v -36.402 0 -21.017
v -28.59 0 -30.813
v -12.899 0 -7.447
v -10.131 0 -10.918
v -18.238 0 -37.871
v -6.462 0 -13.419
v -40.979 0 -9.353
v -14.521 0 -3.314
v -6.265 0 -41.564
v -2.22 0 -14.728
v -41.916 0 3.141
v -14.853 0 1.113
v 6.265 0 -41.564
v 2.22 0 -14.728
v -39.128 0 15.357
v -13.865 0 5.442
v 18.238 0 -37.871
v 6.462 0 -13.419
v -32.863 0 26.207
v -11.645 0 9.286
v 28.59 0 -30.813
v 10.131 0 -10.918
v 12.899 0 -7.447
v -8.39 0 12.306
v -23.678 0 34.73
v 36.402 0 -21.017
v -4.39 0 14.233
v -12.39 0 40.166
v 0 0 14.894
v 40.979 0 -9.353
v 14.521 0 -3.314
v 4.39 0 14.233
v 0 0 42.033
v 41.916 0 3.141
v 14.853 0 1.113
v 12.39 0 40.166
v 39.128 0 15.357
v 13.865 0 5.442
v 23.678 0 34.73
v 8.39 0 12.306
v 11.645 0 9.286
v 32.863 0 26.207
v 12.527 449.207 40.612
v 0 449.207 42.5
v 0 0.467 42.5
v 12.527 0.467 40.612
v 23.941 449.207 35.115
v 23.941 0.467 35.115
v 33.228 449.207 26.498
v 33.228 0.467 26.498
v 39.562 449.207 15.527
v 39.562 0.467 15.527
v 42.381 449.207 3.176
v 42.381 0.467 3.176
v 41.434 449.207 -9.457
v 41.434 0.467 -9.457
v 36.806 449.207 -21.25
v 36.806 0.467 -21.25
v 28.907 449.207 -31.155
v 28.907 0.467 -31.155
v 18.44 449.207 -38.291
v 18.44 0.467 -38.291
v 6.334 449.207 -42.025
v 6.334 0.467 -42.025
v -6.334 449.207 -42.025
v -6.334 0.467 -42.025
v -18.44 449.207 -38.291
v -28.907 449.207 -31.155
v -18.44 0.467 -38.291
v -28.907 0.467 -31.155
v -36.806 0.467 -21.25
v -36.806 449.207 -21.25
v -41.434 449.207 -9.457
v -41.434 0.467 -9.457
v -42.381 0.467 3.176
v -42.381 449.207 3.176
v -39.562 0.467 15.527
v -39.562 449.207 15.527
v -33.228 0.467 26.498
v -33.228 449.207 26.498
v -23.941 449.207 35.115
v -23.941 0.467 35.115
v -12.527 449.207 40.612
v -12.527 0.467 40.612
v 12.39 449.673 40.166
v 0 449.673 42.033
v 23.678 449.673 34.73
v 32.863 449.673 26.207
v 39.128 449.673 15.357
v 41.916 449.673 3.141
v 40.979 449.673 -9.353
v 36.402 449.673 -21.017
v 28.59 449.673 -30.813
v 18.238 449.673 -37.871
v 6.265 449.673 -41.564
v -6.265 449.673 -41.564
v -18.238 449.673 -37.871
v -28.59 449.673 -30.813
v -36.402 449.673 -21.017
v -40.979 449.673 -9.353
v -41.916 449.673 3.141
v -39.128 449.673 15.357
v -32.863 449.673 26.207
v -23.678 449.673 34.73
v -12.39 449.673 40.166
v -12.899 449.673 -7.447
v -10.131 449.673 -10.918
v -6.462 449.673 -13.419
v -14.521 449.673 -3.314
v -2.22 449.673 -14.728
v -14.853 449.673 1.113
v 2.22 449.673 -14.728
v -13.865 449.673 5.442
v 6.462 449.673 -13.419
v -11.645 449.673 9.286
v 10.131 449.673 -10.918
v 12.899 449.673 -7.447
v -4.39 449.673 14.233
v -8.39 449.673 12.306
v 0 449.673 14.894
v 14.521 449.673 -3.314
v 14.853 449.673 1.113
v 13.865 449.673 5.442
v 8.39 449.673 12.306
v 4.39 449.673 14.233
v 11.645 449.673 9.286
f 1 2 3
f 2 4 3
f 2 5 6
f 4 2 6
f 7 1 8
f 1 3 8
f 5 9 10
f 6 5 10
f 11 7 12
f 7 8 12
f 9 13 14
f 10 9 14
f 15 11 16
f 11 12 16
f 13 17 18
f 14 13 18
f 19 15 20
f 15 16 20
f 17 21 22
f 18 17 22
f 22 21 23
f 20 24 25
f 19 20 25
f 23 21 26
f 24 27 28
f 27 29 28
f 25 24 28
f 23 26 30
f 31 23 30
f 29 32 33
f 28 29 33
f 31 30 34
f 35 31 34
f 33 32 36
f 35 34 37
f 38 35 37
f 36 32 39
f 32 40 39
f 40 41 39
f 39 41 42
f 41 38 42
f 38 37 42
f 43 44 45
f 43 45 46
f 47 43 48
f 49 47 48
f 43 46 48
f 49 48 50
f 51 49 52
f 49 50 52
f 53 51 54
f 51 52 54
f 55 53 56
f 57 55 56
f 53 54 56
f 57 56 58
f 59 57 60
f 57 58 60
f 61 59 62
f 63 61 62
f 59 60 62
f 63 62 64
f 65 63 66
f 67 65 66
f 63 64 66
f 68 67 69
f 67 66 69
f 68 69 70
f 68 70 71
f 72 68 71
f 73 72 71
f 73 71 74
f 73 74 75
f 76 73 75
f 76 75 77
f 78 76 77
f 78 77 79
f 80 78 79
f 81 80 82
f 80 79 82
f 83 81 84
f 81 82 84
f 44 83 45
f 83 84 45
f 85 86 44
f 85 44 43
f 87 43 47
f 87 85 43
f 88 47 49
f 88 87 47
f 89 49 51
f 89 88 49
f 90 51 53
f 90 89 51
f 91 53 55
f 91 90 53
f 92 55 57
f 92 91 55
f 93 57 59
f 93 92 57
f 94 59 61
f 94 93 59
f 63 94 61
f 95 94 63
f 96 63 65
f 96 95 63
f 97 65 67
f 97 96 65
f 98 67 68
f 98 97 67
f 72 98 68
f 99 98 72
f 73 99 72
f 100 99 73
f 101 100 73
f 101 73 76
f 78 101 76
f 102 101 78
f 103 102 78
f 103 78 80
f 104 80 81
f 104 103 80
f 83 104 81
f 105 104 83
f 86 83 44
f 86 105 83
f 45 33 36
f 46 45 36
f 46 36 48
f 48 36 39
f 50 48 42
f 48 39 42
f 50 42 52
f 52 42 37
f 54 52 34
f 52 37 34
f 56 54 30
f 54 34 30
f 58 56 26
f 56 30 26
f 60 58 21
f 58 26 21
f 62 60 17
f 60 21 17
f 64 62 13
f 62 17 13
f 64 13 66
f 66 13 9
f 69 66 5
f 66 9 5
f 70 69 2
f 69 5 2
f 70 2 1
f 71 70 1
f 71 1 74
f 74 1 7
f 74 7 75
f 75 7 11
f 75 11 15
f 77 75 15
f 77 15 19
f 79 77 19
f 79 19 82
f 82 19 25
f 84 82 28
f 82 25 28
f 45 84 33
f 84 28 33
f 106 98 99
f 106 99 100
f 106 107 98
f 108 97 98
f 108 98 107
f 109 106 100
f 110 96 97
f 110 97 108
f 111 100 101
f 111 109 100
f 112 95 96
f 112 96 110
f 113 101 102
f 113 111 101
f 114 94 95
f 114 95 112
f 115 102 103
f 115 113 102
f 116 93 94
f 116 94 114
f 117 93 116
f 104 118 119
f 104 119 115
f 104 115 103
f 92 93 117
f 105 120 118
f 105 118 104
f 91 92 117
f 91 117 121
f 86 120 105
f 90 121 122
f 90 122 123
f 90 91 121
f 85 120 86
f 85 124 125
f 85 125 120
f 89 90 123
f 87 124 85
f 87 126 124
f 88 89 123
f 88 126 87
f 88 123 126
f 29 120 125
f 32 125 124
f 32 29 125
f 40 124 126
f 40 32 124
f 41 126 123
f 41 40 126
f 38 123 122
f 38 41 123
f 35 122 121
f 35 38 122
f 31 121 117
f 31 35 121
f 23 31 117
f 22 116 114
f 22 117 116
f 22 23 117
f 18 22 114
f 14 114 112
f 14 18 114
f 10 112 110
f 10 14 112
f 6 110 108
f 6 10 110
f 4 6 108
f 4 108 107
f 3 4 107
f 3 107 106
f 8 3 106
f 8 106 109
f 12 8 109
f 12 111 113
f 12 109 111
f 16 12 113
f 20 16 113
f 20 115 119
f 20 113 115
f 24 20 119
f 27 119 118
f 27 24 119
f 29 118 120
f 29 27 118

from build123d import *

# Parameters (mm, degrees)
SKETCH1_R           = 42.5
BOSS_EXTRUDE1_DEPTH = 449.67329934
SKETCH2_R           = 14.894380749
CUT_EXTRUDE1_DEPTH  = 454.67232243
CHAMFER1_SIZE       = 0.466639487


with BuildPart() as part:
    # Sketch1 → Boss-Extrude1 (new body)
    with BuildSketch(Plane(origin=(0, 0, 0), x_dir=(1, 0, 0), z_dir=(0, 1, 0))):
        Circle(SKETCH1_R)
    extrude(amount=BOSS_EXTRUDE1_DEPTH)

    # Sketch2 → Cut-Extrude1 (cut, through all)
    with BuildSketch(Plane(origin=(0, 0, 0), x_dir=(1, 0, 0), z_dir=(0, 1, 0))):
        Circle(SKETCH2_R)
    extrude(amount=CUT_EXTRUDE1_DEPTH, mode=Mode.SUBTRACT)

    # Chamfer1
    chamfer1_edges = [part.edges().sort_by_distance(p)[0] for p in [
        (-42.5, 449.67329934, 0),
        (-42.5, 0, 0),
    ]]
    chamfer(chamfer1_edges, length=CHAMFER1_SIZE)


solid = part.part
